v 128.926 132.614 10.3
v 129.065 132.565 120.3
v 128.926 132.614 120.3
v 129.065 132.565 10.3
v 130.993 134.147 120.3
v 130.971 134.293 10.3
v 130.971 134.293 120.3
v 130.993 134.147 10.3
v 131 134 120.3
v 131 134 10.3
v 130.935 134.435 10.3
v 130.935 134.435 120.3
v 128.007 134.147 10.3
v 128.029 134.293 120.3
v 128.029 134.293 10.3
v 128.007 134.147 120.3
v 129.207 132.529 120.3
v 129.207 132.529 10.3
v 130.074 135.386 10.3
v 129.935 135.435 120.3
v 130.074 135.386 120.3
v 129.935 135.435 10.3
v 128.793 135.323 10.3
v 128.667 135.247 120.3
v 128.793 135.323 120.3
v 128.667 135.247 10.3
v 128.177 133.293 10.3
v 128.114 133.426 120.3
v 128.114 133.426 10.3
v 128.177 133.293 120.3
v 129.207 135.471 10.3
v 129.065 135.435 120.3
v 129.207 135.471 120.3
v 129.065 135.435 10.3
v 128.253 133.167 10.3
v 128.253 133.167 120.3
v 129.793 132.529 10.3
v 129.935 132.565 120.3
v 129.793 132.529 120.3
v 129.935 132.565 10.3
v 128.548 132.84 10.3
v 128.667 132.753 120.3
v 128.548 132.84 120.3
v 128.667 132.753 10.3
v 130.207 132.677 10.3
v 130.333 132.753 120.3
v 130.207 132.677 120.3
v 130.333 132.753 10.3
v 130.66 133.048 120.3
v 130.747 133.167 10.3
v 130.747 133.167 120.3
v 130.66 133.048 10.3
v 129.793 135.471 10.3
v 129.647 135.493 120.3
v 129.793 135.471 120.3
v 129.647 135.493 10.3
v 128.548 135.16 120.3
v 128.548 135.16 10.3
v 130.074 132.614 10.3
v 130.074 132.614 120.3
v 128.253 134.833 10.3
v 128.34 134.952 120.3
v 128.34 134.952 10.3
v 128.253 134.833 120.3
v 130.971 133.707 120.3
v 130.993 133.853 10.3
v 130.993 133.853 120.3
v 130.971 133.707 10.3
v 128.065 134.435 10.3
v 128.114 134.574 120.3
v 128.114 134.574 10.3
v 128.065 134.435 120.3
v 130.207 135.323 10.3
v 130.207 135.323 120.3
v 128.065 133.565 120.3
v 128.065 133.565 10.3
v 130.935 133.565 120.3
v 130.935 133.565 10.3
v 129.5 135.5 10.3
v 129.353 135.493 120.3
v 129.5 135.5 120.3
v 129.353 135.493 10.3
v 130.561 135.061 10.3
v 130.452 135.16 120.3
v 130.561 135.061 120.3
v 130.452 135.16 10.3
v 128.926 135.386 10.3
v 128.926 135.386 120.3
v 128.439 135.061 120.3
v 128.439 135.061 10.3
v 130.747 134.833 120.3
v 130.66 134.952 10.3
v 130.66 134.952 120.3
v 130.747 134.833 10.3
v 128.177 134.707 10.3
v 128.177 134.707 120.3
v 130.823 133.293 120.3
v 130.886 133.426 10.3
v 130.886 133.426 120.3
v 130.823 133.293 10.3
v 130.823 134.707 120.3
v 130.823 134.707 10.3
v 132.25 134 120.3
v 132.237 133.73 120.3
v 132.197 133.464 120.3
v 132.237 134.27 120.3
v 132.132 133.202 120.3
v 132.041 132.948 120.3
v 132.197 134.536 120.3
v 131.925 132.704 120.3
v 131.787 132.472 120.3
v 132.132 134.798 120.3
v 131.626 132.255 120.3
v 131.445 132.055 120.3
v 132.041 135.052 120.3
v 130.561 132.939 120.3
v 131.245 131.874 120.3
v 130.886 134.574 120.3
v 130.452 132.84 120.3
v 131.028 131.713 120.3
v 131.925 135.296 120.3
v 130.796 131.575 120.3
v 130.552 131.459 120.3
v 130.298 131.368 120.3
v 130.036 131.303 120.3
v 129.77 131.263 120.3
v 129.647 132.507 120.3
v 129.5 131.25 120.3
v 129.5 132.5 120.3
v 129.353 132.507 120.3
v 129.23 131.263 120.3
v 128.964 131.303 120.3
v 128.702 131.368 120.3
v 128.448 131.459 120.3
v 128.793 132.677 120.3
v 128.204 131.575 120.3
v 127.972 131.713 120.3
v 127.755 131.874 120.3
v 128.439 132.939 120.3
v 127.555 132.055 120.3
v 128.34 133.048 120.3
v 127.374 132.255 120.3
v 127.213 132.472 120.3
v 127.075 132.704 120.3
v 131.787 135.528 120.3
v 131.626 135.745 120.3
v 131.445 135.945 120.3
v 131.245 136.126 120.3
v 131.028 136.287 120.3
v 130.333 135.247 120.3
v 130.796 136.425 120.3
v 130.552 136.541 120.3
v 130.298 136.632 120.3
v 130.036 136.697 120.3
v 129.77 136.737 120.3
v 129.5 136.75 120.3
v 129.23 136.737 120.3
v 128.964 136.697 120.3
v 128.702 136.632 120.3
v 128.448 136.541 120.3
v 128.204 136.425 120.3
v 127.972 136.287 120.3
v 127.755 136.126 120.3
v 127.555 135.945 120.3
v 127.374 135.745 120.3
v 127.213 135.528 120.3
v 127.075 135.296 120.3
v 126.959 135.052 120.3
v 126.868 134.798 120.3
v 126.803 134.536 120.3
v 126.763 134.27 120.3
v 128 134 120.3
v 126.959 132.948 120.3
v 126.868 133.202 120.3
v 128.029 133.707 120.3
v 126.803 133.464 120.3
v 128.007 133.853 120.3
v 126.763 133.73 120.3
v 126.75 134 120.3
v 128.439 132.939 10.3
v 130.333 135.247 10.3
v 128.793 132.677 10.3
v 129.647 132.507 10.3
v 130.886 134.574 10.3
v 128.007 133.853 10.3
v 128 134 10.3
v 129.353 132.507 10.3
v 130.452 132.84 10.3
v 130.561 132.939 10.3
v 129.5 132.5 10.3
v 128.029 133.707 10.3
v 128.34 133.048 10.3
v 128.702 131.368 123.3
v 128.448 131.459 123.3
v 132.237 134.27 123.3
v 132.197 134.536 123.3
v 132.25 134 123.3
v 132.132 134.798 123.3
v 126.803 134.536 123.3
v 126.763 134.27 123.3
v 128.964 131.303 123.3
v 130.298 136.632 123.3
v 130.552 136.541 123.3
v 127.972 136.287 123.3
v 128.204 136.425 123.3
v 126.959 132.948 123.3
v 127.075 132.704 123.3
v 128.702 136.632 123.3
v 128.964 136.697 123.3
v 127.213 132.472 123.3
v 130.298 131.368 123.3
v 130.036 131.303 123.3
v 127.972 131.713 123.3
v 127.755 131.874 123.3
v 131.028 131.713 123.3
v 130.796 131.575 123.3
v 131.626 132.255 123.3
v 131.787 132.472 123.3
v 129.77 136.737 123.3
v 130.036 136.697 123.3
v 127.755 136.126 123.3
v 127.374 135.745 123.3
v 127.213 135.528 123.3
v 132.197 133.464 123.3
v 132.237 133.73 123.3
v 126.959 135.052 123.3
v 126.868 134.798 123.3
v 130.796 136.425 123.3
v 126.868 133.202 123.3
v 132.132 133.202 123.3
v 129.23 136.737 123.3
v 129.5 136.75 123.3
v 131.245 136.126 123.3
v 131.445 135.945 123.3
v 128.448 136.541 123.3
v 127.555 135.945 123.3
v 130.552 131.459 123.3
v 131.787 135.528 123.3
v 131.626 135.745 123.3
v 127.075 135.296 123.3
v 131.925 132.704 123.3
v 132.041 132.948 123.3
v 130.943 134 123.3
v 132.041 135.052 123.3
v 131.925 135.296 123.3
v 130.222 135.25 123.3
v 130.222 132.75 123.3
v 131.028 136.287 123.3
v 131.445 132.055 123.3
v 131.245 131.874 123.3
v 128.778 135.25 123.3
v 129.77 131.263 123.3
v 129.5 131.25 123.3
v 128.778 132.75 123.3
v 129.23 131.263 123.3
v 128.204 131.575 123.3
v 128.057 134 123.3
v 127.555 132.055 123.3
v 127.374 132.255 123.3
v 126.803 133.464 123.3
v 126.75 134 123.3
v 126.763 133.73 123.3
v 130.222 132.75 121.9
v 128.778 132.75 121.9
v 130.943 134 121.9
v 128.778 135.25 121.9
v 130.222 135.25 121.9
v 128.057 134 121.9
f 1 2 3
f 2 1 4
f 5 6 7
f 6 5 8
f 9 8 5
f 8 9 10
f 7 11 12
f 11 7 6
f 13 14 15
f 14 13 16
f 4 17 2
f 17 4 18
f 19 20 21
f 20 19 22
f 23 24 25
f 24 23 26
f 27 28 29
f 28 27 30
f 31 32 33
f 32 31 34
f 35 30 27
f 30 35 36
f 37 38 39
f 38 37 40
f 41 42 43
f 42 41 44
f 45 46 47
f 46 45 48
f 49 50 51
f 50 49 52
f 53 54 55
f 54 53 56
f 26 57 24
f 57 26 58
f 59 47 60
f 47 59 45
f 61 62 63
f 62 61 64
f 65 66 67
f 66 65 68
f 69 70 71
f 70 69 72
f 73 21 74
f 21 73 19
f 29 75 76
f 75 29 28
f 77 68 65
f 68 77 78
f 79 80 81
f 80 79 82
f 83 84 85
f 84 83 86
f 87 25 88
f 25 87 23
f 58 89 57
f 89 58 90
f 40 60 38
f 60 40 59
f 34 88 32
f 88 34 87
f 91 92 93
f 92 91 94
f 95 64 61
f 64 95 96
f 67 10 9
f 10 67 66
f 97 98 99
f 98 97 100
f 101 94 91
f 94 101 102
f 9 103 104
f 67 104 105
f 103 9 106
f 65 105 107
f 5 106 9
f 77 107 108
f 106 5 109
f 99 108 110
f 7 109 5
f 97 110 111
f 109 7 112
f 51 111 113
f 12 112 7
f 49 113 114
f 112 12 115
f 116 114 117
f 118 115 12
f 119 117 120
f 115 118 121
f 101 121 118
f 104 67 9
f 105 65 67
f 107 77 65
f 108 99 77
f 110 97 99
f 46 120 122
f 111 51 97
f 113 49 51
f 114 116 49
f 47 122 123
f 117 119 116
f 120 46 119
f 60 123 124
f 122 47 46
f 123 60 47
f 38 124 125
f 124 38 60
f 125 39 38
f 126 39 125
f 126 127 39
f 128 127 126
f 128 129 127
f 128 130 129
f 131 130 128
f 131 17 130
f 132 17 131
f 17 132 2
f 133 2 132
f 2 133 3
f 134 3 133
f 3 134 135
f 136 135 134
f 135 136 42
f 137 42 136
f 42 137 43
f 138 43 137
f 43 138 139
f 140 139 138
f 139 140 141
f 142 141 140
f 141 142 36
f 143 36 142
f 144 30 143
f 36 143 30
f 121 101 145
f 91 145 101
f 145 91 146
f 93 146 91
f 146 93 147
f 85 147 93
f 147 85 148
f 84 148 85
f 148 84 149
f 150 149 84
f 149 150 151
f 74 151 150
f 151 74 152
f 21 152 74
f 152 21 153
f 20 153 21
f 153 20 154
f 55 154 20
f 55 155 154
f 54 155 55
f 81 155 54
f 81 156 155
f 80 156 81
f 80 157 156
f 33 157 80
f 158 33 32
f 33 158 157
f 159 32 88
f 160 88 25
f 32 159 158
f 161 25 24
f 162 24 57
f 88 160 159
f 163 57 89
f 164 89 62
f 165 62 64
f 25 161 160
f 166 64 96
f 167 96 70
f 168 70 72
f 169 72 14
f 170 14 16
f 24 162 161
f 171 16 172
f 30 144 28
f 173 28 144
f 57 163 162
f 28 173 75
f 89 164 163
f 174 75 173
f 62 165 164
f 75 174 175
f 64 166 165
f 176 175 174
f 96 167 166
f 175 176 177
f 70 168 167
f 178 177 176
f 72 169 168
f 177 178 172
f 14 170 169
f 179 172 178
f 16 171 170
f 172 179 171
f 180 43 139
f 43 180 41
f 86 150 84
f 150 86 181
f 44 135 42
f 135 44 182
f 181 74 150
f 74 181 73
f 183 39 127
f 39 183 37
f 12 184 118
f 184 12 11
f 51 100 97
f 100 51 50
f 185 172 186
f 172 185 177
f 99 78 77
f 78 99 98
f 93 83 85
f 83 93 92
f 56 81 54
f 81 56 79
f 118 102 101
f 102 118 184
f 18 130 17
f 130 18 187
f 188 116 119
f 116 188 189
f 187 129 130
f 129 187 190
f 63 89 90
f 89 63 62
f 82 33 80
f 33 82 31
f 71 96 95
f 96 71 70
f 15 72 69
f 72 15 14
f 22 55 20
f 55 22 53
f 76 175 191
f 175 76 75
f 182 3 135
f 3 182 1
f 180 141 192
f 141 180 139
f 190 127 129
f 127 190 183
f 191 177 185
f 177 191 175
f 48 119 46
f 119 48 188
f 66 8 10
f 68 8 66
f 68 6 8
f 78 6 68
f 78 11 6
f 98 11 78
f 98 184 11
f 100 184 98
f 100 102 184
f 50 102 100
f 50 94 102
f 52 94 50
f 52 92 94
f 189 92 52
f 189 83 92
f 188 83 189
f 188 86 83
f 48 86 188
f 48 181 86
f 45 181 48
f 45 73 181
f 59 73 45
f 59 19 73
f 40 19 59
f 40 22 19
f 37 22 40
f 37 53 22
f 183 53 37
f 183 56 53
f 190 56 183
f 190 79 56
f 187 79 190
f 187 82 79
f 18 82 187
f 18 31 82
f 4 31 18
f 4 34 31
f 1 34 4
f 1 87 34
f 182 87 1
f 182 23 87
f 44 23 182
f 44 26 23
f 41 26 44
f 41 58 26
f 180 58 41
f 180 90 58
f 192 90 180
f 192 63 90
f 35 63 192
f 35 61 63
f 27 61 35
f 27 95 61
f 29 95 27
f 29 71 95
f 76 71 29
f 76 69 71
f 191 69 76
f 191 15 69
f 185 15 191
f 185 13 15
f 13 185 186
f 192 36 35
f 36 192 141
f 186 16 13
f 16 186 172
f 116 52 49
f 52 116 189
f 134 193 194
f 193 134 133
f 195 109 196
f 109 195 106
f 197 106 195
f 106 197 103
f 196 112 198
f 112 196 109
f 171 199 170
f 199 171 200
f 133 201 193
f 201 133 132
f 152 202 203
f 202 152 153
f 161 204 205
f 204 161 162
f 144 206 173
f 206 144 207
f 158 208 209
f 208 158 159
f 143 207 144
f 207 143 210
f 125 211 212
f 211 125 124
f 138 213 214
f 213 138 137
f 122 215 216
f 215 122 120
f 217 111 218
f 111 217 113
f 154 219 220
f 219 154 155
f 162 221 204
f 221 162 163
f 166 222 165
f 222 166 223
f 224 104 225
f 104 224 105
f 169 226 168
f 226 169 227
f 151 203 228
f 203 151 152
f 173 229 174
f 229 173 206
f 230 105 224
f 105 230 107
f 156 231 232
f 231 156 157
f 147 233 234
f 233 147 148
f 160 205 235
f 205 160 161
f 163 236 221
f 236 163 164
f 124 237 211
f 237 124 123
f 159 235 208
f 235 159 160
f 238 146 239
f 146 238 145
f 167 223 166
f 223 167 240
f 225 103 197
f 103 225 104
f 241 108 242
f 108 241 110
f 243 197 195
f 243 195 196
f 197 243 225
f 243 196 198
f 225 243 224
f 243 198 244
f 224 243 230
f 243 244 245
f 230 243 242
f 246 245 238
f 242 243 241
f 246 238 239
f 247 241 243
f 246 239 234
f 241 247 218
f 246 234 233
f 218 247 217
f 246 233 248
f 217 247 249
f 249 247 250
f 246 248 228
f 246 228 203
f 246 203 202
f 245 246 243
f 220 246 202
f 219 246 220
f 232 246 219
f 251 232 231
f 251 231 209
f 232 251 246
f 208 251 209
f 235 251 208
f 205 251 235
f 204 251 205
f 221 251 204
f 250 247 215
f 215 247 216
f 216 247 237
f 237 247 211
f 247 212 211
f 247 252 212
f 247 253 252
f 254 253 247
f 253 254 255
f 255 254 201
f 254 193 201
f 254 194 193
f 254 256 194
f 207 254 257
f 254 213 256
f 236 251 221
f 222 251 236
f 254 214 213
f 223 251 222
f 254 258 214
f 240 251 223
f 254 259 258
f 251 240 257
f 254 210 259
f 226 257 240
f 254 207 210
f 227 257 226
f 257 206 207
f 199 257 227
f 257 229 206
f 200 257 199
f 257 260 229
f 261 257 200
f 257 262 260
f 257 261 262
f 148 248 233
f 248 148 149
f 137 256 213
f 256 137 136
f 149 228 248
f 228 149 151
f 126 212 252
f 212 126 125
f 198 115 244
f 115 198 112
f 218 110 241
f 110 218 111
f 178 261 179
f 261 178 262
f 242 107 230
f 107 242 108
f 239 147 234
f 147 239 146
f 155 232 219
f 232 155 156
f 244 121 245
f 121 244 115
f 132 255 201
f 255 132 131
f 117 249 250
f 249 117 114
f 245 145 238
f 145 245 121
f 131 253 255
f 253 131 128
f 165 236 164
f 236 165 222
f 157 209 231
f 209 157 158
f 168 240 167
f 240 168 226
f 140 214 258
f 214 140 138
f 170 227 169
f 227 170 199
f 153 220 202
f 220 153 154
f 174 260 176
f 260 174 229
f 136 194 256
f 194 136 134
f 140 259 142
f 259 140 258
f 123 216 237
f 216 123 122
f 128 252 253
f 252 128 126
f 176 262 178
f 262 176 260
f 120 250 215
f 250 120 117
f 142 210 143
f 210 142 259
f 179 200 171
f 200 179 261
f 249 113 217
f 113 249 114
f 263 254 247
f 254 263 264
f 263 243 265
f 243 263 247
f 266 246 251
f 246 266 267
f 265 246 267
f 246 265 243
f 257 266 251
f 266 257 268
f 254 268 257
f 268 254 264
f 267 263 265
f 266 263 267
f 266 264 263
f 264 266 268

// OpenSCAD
// Generated from the same CSG operations as STEP. Rebuild with spec/build_parent_hand_service.py.
difference(){union(){translate([129.5,134,10.3]) cylinder(r=1.5,h=110,$fn=64);translate([129.5,134,120.3]) cylinder(r=2.75,h=3,$fn=64);}translate([129.5,134,121.9]) cylinder(r=1.4433756729740643,h=1.5,$fn=6);}
